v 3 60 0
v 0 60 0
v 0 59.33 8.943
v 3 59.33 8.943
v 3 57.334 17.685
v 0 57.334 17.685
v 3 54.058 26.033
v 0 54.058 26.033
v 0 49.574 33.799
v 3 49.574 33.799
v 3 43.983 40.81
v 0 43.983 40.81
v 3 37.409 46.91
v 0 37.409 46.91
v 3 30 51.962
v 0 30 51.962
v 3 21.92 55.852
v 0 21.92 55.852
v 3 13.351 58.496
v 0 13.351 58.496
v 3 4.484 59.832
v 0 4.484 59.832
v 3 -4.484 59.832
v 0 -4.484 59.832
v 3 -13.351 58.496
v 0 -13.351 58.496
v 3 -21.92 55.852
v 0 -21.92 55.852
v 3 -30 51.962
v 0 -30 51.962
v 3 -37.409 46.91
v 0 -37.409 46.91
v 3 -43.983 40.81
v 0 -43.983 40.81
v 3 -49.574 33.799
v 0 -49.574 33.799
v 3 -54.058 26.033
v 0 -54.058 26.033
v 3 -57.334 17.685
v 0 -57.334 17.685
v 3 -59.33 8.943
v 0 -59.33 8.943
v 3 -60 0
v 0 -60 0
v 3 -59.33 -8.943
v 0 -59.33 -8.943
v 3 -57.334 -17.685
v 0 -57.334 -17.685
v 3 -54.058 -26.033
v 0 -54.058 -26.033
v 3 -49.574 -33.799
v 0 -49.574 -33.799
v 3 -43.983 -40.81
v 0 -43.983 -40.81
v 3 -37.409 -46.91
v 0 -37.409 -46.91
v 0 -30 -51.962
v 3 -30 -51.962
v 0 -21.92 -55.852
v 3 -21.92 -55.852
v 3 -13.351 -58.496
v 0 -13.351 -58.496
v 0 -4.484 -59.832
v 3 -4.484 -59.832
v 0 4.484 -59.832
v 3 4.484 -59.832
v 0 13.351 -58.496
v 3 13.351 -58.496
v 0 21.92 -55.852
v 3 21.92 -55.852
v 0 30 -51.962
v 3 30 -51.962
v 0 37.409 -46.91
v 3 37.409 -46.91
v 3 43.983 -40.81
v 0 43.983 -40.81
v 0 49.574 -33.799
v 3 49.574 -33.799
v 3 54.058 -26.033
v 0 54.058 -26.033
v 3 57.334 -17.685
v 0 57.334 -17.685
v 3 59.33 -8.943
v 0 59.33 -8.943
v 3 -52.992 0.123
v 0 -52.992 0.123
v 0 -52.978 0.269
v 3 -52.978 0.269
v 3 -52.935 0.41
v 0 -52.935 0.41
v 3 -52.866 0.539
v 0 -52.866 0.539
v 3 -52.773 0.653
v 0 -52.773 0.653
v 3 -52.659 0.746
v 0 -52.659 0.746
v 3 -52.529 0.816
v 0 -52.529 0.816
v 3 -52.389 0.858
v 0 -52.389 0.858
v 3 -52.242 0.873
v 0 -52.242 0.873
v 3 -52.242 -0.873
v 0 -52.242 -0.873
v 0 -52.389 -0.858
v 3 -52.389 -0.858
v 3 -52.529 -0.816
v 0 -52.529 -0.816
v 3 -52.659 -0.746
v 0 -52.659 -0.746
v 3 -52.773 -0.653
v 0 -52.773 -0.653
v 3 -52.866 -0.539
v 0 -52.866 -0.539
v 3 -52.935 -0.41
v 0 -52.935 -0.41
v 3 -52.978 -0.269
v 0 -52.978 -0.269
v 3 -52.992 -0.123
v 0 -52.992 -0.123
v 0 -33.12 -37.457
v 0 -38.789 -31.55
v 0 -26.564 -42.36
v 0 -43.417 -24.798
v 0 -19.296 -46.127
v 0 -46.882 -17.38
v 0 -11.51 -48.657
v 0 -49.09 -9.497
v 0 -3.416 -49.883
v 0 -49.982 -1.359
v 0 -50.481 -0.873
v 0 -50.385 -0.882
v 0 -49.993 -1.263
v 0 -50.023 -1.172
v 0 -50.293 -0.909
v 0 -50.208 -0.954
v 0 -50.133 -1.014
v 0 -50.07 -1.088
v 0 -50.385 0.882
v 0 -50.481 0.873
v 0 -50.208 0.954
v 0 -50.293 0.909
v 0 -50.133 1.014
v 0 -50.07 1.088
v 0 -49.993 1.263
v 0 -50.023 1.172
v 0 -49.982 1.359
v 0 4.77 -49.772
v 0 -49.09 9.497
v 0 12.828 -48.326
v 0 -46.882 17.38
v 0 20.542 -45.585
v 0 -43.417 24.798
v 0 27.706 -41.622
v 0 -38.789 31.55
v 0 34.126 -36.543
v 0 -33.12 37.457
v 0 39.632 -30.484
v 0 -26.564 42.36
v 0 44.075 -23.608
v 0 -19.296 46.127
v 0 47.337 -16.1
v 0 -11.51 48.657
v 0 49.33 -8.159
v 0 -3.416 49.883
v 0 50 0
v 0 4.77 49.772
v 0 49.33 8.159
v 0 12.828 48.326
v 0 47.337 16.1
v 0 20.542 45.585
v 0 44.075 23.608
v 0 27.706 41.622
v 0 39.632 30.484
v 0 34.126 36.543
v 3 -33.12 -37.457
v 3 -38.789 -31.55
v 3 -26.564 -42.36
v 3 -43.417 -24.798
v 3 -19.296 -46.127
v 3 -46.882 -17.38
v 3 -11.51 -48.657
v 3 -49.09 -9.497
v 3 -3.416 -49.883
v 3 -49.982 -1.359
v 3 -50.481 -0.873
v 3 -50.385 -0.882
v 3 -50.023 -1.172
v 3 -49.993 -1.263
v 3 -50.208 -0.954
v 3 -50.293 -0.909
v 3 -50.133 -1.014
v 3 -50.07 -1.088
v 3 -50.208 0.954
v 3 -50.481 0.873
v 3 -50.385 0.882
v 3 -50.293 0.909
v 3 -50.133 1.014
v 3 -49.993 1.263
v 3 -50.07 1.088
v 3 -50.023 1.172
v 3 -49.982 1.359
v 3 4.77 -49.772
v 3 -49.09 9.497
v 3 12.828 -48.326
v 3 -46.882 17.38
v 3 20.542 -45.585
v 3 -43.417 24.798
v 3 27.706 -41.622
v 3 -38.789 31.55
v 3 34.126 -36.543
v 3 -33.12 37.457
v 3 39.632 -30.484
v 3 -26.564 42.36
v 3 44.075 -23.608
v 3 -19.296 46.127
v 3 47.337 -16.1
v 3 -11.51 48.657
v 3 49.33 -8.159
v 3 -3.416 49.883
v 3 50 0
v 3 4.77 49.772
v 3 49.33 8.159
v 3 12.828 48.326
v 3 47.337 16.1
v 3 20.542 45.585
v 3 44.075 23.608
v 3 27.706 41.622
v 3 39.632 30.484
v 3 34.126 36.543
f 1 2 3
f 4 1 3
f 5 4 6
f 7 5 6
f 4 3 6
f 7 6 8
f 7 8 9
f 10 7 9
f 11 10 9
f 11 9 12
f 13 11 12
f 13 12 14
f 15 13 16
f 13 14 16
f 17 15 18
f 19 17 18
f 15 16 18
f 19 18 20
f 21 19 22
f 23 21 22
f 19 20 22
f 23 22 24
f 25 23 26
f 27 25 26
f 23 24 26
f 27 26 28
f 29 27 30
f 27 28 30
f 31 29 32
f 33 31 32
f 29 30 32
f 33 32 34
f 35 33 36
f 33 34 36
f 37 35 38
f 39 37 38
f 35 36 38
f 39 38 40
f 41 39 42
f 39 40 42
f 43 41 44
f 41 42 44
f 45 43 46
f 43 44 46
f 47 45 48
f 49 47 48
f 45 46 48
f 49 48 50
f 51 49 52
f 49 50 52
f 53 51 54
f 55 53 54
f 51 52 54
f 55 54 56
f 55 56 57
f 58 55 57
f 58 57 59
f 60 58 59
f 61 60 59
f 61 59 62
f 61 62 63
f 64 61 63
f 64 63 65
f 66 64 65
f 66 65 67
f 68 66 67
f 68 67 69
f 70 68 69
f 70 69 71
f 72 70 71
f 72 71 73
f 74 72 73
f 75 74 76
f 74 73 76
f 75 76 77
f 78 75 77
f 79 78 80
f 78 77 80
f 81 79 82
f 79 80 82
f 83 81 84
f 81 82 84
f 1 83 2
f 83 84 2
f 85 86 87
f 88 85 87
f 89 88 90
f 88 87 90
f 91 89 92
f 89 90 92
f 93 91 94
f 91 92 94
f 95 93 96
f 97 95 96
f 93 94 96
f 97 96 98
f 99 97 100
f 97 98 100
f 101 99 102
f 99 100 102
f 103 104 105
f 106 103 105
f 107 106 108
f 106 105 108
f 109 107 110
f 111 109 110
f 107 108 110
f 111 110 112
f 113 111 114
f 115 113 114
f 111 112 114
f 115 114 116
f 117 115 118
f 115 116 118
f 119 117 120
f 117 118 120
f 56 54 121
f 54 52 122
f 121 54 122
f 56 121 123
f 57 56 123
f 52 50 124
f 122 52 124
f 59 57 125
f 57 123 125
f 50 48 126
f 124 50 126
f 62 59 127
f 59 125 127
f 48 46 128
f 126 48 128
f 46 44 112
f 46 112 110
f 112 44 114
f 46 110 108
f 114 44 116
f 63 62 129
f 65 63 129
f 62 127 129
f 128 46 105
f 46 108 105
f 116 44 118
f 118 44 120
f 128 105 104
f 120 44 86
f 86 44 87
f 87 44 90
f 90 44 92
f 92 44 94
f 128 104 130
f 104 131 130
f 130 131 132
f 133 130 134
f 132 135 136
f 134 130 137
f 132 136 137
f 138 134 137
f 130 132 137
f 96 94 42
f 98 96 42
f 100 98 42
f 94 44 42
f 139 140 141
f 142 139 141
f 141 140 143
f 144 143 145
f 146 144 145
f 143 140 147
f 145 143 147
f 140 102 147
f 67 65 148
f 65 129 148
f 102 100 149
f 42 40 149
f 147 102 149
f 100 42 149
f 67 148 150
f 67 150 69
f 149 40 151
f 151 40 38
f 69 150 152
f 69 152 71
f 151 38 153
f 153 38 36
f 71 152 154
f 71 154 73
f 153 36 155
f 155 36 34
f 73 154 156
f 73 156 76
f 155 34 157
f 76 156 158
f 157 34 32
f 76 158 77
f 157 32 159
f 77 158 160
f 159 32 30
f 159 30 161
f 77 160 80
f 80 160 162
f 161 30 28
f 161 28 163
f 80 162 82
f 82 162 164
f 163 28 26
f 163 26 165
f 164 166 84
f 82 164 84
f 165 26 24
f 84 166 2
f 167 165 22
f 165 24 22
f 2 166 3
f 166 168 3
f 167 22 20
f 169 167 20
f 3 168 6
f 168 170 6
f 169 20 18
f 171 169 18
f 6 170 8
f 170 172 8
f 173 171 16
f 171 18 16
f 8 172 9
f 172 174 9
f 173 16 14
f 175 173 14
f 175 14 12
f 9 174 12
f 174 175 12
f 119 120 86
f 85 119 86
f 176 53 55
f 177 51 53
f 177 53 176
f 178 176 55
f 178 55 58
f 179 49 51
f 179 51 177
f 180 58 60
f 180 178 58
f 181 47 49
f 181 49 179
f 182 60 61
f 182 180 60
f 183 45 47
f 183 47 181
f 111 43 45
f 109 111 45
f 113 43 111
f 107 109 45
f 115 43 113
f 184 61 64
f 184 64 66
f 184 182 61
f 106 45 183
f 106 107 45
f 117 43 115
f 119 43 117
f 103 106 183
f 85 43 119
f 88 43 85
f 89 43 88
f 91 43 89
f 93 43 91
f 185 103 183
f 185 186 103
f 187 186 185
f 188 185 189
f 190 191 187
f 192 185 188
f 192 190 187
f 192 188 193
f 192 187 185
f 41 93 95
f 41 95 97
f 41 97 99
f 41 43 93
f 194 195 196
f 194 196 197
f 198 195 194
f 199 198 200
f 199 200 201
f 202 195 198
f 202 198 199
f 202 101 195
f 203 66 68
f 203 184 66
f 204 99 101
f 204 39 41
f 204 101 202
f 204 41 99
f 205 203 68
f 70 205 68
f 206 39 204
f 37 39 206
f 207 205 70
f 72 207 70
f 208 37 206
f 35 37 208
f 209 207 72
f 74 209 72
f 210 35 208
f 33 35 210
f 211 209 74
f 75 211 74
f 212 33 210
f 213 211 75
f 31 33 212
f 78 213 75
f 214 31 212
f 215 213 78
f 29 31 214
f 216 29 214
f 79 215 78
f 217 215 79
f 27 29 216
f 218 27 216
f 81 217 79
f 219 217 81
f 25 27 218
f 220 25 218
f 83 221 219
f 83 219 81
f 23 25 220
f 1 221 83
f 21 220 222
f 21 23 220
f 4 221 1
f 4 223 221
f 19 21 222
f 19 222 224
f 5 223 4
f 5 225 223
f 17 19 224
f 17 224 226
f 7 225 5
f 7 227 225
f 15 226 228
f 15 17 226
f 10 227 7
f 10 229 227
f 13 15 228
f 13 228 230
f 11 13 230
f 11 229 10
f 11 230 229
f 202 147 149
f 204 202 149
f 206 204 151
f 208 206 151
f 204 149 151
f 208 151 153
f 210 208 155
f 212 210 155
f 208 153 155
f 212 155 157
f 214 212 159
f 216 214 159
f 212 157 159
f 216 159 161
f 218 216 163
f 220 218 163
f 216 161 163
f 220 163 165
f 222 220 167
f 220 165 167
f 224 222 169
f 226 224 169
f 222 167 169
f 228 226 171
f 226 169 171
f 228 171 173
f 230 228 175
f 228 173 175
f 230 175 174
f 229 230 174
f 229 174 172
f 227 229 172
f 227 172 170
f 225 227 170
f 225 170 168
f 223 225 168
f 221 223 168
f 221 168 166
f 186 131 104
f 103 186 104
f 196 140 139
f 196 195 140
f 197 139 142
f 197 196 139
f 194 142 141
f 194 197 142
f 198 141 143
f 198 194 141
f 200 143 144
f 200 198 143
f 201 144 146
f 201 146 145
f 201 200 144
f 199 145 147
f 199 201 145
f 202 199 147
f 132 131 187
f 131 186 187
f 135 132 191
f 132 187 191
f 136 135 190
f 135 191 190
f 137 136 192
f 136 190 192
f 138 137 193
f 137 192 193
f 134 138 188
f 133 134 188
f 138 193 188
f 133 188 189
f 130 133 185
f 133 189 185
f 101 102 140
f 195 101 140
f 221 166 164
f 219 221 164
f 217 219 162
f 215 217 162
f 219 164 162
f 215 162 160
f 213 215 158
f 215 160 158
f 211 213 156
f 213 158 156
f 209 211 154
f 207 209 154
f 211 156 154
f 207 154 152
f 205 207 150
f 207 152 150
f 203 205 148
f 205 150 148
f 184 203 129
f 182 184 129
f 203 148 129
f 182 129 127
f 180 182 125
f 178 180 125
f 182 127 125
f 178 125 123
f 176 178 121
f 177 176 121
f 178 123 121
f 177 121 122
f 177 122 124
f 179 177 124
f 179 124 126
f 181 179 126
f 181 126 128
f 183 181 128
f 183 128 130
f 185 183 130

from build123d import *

# Parameters (mm, degrees)
F1_R     = 60
F2_DEPTH = 3
F3_R     = 0.5


with BuildPart() as f2:
    # F1 (on Right) → F2 (new body)
    with BuildSketch(Plane.YZ):
        Circle(F1_R)
        with BuildLine():
            ThreePointArc((-49.992385, 0.87262), (0.436327, 49.998096), (50, 0))
            ThreePointArc((50, 0), (0.436327, -49.998096), (-49.992385, -0.87262))
            Line((-49.992385, -0.87262), (-52.242385, -0.87262))
            ThreePointArc((-52.242385, -0.87262), (-52.772715, -0.65295), (-52.992385, -0.12262))
            Line((-52.992385, -0.12262), (-52.992385, 0.12262))
            ThreePointArc((-52.992385, 0.12262), (-52.772715, 0.65295), (-52.242385, 0.87262))
            Line((-52.242385, 0.87262), (-49.992385, 0.87262))
        make_face(mode=Mode.SUBTRACT)
    extrude(amount=F2_DEPTH)

    # F3
    f3_edges = [f2.edges().sort_by_distance(p)[0] for p in [
        (1.5, -49.992385, 0.87262),
        (1.5, -49.992385, -0.87262),
    ]]
    fillet(f3_edges, radius=F3_R)


solid = f2.part
